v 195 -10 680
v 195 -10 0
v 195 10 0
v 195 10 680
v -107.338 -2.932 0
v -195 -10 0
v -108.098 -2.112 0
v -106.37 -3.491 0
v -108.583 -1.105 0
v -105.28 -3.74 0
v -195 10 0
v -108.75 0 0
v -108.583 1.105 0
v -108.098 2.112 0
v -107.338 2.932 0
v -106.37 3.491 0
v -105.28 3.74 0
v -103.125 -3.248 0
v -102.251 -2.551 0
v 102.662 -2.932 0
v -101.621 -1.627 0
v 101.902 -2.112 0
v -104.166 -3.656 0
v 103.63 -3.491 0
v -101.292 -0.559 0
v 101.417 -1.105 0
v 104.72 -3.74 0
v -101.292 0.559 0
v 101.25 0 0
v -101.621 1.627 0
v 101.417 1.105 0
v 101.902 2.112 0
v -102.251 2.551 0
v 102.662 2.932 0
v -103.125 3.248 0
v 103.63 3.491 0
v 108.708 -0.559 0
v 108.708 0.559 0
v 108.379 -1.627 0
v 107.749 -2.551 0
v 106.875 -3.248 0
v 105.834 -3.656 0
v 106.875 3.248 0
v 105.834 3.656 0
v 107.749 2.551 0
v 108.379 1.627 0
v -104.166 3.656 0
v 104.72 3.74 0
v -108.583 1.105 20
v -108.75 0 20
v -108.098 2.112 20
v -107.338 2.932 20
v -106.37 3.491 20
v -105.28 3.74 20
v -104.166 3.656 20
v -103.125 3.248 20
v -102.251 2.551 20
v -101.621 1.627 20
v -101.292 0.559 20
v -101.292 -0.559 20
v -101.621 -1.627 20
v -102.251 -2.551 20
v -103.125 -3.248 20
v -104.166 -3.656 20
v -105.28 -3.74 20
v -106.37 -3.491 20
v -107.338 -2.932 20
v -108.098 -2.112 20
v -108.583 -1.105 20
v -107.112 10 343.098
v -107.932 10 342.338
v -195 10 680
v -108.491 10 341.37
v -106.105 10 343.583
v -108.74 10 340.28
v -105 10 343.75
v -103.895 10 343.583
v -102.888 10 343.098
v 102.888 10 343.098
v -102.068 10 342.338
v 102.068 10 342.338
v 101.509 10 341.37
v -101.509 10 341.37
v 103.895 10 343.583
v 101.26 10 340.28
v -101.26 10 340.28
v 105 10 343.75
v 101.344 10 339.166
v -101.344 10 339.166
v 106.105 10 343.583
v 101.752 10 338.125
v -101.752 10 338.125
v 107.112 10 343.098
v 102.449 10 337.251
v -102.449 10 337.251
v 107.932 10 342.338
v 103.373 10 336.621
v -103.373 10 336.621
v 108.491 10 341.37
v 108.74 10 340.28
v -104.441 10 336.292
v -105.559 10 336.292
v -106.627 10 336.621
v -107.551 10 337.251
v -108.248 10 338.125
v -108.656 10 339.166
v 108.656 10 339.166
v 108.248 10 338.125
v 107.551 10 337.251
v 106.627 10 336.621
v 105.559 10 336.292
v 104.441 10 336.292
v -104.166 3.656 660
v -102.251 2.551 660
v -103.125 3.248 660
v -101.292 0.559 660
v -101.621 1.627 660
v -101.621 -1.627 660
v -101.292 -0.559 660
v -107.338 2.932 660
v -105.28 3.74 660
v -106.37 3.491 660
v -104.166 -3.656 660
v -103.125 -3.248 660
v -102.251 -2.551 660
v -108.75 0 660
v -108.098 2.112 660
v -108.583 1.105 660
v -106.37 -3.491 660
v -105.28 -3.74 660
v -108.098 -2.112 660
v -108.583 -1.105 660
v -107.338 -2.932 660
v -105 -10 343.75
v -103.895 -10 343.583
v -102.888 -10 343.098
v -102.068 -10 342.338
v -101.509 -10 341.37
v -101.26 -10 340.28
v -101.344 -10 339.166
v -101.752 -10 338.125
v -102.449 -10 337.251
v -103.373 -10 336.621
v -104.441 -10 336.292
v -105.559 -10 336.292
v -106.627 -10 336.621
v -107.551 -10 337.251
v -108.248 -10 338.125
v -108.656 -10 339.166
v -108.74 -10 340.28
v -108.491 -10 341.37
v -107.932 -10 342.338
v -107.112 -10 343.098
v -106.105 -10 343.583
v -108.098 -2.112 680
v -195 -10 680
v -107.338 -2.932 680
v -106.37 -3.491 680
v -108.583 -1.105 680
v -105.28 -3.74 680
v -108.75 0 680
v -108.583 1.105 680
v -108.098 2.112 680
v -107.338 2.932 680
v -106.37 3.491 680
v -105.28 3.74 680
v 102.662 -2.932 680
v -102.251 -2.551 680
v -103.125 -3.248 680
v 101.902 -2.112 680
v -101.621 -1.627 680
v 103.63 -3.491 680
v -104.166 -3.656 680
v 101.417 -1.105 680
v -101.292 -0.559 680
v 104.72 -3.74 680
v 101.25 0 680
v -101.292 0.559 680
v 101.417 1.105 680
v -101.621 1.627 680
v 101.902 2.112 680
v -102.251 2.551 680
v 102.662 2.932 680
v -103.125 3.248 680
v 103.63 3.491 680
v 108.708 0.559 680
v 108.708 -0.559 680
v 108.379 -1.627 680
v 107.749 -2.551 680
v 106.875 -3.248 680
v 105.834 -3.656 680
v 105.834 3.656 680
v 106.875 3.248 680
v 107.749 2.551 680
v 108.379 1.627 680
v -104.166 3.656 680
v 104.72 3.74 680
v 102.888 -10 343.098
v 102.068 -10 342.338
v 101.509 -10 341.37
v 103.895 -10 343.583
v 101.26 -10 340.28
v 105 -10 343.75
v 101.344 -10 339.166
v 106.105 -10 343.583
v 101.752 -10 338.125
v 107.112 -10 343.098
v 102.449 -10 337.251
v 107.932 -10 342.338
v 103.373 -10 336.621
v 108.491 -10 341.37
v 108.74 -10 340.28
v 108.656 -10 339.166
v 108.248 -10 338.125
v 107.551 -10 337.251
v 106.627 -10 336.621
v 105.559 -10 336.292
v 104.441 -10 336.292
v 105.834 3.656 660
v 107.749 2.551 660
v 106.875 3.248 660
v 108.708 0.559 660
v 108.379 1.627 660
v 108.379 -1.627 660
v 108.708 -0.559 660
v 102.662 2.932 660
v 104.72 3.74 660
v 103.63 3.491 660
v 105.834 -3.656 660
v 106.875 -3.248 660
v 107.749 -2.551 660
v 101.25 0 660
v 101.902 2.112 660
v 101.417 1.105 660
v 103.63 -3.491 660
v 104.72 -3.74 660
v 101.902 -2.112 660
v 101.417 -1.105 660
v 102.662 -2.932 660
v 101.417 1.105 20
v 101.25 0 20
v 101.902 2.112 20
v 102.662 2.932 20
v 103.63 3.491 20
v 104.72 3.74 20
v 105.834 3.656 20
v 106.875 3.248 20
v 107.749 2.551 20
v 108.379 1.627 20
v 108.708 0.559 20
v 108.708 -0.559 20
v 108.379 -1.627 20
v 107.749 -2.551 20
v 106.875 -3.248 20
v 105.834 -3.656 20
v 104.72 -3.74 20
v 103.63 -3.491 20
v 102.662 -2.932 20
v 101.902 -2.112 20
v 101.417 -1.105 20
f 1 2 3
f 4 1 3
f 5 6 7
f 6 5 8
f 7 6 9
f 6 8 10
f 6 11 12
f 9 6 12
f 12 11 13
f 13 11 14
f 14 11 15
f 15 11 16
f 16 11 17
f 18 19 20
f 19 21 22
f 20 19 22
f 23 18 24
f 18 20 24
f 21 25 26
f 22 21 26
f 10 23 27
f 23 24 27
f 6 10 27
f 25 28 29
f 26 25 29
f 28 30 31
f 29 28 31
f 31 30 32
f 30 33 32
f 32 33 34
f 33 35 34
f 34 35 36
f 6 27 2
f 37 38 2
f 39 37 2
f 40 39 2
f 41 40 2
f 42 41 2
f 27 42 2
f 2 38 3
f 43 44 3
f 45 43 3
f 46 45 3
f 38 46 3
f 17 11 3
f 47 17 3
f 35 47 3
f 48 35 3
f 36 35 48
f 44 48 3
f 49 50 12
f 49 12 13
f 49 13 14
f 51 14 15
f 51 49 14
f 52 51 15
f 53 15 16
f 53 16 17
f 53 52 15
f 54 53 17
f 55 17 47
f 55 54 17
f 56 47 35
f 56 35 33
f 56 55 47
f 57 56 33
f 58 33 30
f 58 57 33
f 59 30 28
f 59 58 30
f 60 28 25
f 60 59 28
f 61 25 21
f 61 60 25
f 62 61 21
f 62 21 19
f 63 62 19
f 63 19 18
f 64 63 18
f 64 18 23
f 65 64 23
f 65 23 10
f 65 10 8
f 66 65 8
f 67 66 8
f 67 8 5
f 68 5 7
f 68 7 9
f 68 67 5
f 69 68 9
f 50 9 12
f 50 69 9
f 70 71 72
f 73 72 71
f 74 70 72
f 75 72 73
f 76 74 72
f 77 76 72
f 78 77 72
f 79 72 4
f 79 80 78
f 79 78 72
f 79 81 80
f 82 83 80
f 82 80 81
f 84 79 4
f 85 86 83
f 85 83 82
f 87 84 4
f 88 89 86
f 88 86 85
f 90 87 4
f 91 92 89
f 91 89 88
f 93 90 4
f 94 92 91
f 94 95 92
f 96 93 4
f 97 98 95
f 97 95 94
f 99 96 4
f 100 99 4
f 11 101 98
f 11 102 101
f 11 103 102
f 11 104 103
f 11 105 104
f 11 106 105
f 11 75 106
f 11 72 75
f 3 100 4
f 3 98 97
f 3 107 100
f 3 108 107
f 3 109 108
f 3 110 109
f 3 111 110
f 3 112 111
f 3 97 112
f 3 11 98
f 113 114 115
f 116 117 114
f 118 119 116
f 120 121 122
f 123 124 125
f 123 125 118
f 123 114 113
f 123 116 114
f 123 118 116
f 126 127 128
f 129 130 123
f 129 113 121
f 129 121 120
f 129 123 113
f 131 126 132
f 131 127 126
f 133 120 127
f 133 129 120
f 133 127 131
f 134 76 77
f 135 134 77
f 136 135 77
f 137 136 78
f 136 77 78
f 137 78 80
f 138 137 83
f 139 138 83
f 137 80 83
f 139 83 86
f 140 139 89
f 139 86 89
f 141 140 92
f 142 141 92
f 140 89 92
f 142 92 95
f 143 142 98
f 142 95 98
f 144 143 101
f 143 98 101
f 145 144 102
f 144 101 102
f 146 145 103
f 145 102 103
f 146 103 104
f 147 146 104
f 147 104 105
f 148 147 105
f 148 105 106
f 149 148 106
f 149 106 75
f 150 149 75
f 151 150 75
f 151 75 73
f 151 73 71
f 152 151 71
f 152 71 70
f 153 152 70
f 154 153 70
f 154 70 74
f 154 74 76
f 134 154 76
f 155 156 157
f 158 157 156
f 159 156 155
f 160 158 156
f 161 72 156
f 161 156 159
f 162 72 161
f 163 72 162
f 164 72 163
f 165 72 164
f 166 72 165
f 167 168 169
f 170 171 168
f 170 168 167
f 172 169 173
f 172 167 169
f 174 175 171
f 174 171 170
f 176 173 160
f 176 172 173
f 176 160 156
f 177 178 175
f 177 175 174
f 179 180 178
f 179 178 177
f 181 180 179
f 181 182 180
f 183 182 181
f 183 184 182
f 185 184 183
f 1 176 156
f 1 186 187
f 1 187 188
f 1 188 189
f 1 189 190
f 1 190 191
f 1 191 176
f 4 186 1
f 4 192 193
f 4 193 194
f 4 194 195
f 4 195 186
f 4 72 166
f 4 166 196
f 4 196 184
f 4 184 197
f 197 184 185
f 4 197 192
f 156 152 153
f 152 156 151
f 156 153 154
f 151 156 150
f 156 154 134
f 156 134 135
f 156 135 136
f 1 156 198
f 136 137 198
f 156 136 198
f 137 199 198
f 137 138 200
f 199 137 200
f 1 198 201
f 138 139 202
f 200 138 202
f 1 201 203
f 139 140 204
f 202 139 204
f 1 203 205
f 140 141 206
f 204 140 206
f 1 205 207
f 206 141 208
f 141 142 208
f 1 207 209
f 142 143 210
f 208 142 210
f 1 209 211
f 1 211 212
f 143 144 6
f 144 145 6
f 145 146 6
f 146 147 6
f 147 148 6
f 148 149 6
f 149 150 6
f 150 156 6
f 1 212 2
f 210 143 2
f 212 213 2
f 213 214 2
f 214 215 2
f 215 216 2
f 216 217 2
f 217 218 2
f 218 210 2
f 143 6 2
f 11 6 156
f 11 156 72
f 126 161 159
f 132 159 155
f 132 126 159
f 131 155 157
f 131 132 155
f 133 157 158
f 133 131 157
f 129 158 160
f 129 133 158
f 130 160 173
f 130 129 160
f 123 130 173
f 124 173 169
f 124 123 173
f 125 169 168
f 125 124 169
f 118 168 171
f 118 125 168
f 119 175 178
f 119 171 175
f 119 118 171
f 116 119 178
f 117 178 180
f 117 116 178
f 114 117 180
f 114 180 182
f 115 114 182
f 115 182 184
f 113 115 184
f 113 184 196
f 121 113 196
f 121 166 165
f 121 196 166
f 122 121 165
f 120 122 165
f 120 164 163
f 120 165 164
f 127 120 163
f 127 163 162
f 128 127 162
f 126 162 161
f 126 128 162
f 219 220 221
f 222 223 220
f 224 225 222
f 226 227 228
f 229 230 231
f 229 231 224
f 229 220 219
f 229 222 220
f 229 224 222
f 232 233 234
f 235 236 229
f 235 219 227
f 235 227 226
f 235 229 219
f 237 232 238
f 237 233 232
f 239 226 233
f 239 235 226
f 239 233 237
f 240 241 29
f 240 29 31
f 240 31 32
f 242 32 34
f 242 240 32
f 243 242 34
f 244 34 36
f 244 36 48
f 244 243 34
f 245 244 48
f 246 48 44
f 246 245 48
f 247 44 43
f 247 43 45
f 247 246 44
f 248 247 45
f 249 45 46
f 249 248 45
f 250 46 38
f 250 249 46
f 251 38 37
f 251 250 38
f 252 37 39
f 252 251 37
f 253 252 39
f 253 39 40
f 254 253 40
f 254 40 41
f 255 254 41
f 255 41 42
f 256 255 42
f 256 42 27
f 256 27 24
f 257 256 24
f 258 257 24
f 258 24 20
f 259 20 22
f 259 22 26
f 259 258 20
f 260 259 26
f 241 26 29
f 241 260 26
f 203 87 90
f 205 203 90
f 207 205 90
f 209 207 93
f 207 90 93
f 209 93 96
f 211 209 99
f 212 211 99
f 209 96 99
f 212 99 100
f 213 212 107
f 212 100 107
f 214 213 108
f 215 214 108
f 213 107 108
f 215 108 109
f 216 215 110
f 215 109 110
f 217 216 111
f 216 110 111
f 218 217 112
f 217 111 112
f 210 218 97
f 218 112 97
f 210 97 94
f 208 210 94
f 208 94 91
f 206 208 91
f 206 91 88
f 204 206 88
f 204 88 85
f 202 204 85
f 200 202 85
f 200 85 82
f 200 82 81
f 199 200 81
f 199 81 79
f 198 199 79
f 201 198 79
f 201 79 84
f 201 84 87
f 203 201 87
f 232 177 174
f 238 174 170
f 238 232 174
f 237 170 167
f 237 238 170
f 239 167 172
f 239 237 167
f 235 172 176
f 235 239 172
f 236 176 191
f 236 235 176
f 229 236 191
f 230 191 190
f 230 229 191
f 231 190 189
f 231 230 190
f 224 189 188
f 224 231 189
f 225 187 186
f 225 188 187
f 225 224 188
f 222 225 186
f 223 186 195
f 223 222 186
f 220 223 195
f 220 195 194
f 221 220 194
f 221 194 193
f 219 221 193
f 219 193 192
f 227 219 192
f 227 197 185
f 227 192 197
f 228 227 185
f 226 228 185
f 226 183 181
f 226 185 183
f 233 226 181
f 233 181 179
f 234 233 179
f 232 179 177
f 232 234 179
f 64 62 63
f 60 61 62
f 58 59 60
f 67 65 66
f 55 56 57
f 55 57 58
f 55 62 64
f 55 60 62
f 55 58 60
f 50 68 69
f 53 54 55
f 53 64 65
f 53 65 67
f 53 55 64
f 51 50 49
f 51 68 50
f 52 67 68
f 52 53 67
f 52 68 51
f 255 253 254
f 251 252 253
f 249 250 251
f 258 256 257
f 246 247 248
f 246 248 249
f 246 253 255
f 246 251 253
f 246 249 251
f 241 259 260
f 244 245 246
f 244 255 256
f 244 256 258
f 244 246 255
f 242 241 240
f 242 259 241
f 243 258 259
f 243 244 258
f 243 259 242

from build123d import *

# Parameters (mm, degrees)
ESQUISSE1_W                  = 390
ESQUISSE1_H                  = 20
BOSS_EXTRU_1_DEPTH           = 680
ENL_V_MAT_EXTRU_1_DEPTH      = 11
ENL_V_MAT_EXTRU_1_DEPTH_BACK = 20
ESQUISSE2_R                  = 3.75
ENL_V_START                  = -20
ESQUISSE4_R                  = 3.75
ENL_V_MAT_EXTRU_2_DEPTH      = 20
ESQUISSE5_R                  = 3.75
ENL_V_MAT_EXTRU_3_DEPTH      = 35


with BuildPart() as part:
    # Esquisse1 → Boss.-Extru.1 (new body)
    with BuildSketch(Plane.XY):
        Rectangle(ESQUISSE1_W, ESQUISSE1_H)
    extrude(amount=BOSS_EXTRU_1_DEPTH)

    # Esquisse2 → Enlèv. mat.-Extru.1 (cut, two sides: drawn at the far end of the back side and taken through both)
    with BuildSketch(Plane.XY.offset(680).offset(-ENL_V_MAT_EXTRU_1_DEPTH_BACK)):
        with Locations(Location((-105, 0, 0), (0, 0, 180))):
            Circle(ESQUISSE2_R)
        with Locations(Location((105, 0, 0), (0, 0, 180))):
            Circle(ESQUISSE2_R)
    extrude(amount=ENL_V_MAT_EXTRU_1_DEPTH + ENL_V_MAT_EXTRU_1_DEPTH_BACK, mode=Mode.SUBTRACT)

    # Esquisse4 → Enlèv. mat.-Extru.2 (cut)
    with BuildSketch(Plane(origin=(0, 0, 0), x_dir=(-1, 0, 0), z_dir=(0, 0, -1)).offset(ENL_V_START)):
        with Locations((-105, 0)):
            Circle(ESQUISSE4_R)
        with Locations((105, 0)):
            Circle(ESQUISSE4_R)
    extrude(amount=ENL_V_MAT_EXTRU_2_DEPTH, mode=Mode.SUBTRACT)

    # Esquisse5 → Enlèv. mat.-Extru.3 (cut)
    with BuildSketch(Plane(origin=(0, 10, 0), x_dir=(1, 0, 0), z_dir=(0, 1, 0))):
        with Locations(Location((-105, -340, 0), (0, 0, 270))):
            Circle(ESQUISSE5_R)
        with Locations(Location((105, -340, 0), (0, 0, 270))):
            Circle(ESQUISSE5_R)
    extrude(amount=-ENL_V_MAT_EXTRU_3_DEPTH, mode=Mode.SUBTRACT)


solid = part.part
